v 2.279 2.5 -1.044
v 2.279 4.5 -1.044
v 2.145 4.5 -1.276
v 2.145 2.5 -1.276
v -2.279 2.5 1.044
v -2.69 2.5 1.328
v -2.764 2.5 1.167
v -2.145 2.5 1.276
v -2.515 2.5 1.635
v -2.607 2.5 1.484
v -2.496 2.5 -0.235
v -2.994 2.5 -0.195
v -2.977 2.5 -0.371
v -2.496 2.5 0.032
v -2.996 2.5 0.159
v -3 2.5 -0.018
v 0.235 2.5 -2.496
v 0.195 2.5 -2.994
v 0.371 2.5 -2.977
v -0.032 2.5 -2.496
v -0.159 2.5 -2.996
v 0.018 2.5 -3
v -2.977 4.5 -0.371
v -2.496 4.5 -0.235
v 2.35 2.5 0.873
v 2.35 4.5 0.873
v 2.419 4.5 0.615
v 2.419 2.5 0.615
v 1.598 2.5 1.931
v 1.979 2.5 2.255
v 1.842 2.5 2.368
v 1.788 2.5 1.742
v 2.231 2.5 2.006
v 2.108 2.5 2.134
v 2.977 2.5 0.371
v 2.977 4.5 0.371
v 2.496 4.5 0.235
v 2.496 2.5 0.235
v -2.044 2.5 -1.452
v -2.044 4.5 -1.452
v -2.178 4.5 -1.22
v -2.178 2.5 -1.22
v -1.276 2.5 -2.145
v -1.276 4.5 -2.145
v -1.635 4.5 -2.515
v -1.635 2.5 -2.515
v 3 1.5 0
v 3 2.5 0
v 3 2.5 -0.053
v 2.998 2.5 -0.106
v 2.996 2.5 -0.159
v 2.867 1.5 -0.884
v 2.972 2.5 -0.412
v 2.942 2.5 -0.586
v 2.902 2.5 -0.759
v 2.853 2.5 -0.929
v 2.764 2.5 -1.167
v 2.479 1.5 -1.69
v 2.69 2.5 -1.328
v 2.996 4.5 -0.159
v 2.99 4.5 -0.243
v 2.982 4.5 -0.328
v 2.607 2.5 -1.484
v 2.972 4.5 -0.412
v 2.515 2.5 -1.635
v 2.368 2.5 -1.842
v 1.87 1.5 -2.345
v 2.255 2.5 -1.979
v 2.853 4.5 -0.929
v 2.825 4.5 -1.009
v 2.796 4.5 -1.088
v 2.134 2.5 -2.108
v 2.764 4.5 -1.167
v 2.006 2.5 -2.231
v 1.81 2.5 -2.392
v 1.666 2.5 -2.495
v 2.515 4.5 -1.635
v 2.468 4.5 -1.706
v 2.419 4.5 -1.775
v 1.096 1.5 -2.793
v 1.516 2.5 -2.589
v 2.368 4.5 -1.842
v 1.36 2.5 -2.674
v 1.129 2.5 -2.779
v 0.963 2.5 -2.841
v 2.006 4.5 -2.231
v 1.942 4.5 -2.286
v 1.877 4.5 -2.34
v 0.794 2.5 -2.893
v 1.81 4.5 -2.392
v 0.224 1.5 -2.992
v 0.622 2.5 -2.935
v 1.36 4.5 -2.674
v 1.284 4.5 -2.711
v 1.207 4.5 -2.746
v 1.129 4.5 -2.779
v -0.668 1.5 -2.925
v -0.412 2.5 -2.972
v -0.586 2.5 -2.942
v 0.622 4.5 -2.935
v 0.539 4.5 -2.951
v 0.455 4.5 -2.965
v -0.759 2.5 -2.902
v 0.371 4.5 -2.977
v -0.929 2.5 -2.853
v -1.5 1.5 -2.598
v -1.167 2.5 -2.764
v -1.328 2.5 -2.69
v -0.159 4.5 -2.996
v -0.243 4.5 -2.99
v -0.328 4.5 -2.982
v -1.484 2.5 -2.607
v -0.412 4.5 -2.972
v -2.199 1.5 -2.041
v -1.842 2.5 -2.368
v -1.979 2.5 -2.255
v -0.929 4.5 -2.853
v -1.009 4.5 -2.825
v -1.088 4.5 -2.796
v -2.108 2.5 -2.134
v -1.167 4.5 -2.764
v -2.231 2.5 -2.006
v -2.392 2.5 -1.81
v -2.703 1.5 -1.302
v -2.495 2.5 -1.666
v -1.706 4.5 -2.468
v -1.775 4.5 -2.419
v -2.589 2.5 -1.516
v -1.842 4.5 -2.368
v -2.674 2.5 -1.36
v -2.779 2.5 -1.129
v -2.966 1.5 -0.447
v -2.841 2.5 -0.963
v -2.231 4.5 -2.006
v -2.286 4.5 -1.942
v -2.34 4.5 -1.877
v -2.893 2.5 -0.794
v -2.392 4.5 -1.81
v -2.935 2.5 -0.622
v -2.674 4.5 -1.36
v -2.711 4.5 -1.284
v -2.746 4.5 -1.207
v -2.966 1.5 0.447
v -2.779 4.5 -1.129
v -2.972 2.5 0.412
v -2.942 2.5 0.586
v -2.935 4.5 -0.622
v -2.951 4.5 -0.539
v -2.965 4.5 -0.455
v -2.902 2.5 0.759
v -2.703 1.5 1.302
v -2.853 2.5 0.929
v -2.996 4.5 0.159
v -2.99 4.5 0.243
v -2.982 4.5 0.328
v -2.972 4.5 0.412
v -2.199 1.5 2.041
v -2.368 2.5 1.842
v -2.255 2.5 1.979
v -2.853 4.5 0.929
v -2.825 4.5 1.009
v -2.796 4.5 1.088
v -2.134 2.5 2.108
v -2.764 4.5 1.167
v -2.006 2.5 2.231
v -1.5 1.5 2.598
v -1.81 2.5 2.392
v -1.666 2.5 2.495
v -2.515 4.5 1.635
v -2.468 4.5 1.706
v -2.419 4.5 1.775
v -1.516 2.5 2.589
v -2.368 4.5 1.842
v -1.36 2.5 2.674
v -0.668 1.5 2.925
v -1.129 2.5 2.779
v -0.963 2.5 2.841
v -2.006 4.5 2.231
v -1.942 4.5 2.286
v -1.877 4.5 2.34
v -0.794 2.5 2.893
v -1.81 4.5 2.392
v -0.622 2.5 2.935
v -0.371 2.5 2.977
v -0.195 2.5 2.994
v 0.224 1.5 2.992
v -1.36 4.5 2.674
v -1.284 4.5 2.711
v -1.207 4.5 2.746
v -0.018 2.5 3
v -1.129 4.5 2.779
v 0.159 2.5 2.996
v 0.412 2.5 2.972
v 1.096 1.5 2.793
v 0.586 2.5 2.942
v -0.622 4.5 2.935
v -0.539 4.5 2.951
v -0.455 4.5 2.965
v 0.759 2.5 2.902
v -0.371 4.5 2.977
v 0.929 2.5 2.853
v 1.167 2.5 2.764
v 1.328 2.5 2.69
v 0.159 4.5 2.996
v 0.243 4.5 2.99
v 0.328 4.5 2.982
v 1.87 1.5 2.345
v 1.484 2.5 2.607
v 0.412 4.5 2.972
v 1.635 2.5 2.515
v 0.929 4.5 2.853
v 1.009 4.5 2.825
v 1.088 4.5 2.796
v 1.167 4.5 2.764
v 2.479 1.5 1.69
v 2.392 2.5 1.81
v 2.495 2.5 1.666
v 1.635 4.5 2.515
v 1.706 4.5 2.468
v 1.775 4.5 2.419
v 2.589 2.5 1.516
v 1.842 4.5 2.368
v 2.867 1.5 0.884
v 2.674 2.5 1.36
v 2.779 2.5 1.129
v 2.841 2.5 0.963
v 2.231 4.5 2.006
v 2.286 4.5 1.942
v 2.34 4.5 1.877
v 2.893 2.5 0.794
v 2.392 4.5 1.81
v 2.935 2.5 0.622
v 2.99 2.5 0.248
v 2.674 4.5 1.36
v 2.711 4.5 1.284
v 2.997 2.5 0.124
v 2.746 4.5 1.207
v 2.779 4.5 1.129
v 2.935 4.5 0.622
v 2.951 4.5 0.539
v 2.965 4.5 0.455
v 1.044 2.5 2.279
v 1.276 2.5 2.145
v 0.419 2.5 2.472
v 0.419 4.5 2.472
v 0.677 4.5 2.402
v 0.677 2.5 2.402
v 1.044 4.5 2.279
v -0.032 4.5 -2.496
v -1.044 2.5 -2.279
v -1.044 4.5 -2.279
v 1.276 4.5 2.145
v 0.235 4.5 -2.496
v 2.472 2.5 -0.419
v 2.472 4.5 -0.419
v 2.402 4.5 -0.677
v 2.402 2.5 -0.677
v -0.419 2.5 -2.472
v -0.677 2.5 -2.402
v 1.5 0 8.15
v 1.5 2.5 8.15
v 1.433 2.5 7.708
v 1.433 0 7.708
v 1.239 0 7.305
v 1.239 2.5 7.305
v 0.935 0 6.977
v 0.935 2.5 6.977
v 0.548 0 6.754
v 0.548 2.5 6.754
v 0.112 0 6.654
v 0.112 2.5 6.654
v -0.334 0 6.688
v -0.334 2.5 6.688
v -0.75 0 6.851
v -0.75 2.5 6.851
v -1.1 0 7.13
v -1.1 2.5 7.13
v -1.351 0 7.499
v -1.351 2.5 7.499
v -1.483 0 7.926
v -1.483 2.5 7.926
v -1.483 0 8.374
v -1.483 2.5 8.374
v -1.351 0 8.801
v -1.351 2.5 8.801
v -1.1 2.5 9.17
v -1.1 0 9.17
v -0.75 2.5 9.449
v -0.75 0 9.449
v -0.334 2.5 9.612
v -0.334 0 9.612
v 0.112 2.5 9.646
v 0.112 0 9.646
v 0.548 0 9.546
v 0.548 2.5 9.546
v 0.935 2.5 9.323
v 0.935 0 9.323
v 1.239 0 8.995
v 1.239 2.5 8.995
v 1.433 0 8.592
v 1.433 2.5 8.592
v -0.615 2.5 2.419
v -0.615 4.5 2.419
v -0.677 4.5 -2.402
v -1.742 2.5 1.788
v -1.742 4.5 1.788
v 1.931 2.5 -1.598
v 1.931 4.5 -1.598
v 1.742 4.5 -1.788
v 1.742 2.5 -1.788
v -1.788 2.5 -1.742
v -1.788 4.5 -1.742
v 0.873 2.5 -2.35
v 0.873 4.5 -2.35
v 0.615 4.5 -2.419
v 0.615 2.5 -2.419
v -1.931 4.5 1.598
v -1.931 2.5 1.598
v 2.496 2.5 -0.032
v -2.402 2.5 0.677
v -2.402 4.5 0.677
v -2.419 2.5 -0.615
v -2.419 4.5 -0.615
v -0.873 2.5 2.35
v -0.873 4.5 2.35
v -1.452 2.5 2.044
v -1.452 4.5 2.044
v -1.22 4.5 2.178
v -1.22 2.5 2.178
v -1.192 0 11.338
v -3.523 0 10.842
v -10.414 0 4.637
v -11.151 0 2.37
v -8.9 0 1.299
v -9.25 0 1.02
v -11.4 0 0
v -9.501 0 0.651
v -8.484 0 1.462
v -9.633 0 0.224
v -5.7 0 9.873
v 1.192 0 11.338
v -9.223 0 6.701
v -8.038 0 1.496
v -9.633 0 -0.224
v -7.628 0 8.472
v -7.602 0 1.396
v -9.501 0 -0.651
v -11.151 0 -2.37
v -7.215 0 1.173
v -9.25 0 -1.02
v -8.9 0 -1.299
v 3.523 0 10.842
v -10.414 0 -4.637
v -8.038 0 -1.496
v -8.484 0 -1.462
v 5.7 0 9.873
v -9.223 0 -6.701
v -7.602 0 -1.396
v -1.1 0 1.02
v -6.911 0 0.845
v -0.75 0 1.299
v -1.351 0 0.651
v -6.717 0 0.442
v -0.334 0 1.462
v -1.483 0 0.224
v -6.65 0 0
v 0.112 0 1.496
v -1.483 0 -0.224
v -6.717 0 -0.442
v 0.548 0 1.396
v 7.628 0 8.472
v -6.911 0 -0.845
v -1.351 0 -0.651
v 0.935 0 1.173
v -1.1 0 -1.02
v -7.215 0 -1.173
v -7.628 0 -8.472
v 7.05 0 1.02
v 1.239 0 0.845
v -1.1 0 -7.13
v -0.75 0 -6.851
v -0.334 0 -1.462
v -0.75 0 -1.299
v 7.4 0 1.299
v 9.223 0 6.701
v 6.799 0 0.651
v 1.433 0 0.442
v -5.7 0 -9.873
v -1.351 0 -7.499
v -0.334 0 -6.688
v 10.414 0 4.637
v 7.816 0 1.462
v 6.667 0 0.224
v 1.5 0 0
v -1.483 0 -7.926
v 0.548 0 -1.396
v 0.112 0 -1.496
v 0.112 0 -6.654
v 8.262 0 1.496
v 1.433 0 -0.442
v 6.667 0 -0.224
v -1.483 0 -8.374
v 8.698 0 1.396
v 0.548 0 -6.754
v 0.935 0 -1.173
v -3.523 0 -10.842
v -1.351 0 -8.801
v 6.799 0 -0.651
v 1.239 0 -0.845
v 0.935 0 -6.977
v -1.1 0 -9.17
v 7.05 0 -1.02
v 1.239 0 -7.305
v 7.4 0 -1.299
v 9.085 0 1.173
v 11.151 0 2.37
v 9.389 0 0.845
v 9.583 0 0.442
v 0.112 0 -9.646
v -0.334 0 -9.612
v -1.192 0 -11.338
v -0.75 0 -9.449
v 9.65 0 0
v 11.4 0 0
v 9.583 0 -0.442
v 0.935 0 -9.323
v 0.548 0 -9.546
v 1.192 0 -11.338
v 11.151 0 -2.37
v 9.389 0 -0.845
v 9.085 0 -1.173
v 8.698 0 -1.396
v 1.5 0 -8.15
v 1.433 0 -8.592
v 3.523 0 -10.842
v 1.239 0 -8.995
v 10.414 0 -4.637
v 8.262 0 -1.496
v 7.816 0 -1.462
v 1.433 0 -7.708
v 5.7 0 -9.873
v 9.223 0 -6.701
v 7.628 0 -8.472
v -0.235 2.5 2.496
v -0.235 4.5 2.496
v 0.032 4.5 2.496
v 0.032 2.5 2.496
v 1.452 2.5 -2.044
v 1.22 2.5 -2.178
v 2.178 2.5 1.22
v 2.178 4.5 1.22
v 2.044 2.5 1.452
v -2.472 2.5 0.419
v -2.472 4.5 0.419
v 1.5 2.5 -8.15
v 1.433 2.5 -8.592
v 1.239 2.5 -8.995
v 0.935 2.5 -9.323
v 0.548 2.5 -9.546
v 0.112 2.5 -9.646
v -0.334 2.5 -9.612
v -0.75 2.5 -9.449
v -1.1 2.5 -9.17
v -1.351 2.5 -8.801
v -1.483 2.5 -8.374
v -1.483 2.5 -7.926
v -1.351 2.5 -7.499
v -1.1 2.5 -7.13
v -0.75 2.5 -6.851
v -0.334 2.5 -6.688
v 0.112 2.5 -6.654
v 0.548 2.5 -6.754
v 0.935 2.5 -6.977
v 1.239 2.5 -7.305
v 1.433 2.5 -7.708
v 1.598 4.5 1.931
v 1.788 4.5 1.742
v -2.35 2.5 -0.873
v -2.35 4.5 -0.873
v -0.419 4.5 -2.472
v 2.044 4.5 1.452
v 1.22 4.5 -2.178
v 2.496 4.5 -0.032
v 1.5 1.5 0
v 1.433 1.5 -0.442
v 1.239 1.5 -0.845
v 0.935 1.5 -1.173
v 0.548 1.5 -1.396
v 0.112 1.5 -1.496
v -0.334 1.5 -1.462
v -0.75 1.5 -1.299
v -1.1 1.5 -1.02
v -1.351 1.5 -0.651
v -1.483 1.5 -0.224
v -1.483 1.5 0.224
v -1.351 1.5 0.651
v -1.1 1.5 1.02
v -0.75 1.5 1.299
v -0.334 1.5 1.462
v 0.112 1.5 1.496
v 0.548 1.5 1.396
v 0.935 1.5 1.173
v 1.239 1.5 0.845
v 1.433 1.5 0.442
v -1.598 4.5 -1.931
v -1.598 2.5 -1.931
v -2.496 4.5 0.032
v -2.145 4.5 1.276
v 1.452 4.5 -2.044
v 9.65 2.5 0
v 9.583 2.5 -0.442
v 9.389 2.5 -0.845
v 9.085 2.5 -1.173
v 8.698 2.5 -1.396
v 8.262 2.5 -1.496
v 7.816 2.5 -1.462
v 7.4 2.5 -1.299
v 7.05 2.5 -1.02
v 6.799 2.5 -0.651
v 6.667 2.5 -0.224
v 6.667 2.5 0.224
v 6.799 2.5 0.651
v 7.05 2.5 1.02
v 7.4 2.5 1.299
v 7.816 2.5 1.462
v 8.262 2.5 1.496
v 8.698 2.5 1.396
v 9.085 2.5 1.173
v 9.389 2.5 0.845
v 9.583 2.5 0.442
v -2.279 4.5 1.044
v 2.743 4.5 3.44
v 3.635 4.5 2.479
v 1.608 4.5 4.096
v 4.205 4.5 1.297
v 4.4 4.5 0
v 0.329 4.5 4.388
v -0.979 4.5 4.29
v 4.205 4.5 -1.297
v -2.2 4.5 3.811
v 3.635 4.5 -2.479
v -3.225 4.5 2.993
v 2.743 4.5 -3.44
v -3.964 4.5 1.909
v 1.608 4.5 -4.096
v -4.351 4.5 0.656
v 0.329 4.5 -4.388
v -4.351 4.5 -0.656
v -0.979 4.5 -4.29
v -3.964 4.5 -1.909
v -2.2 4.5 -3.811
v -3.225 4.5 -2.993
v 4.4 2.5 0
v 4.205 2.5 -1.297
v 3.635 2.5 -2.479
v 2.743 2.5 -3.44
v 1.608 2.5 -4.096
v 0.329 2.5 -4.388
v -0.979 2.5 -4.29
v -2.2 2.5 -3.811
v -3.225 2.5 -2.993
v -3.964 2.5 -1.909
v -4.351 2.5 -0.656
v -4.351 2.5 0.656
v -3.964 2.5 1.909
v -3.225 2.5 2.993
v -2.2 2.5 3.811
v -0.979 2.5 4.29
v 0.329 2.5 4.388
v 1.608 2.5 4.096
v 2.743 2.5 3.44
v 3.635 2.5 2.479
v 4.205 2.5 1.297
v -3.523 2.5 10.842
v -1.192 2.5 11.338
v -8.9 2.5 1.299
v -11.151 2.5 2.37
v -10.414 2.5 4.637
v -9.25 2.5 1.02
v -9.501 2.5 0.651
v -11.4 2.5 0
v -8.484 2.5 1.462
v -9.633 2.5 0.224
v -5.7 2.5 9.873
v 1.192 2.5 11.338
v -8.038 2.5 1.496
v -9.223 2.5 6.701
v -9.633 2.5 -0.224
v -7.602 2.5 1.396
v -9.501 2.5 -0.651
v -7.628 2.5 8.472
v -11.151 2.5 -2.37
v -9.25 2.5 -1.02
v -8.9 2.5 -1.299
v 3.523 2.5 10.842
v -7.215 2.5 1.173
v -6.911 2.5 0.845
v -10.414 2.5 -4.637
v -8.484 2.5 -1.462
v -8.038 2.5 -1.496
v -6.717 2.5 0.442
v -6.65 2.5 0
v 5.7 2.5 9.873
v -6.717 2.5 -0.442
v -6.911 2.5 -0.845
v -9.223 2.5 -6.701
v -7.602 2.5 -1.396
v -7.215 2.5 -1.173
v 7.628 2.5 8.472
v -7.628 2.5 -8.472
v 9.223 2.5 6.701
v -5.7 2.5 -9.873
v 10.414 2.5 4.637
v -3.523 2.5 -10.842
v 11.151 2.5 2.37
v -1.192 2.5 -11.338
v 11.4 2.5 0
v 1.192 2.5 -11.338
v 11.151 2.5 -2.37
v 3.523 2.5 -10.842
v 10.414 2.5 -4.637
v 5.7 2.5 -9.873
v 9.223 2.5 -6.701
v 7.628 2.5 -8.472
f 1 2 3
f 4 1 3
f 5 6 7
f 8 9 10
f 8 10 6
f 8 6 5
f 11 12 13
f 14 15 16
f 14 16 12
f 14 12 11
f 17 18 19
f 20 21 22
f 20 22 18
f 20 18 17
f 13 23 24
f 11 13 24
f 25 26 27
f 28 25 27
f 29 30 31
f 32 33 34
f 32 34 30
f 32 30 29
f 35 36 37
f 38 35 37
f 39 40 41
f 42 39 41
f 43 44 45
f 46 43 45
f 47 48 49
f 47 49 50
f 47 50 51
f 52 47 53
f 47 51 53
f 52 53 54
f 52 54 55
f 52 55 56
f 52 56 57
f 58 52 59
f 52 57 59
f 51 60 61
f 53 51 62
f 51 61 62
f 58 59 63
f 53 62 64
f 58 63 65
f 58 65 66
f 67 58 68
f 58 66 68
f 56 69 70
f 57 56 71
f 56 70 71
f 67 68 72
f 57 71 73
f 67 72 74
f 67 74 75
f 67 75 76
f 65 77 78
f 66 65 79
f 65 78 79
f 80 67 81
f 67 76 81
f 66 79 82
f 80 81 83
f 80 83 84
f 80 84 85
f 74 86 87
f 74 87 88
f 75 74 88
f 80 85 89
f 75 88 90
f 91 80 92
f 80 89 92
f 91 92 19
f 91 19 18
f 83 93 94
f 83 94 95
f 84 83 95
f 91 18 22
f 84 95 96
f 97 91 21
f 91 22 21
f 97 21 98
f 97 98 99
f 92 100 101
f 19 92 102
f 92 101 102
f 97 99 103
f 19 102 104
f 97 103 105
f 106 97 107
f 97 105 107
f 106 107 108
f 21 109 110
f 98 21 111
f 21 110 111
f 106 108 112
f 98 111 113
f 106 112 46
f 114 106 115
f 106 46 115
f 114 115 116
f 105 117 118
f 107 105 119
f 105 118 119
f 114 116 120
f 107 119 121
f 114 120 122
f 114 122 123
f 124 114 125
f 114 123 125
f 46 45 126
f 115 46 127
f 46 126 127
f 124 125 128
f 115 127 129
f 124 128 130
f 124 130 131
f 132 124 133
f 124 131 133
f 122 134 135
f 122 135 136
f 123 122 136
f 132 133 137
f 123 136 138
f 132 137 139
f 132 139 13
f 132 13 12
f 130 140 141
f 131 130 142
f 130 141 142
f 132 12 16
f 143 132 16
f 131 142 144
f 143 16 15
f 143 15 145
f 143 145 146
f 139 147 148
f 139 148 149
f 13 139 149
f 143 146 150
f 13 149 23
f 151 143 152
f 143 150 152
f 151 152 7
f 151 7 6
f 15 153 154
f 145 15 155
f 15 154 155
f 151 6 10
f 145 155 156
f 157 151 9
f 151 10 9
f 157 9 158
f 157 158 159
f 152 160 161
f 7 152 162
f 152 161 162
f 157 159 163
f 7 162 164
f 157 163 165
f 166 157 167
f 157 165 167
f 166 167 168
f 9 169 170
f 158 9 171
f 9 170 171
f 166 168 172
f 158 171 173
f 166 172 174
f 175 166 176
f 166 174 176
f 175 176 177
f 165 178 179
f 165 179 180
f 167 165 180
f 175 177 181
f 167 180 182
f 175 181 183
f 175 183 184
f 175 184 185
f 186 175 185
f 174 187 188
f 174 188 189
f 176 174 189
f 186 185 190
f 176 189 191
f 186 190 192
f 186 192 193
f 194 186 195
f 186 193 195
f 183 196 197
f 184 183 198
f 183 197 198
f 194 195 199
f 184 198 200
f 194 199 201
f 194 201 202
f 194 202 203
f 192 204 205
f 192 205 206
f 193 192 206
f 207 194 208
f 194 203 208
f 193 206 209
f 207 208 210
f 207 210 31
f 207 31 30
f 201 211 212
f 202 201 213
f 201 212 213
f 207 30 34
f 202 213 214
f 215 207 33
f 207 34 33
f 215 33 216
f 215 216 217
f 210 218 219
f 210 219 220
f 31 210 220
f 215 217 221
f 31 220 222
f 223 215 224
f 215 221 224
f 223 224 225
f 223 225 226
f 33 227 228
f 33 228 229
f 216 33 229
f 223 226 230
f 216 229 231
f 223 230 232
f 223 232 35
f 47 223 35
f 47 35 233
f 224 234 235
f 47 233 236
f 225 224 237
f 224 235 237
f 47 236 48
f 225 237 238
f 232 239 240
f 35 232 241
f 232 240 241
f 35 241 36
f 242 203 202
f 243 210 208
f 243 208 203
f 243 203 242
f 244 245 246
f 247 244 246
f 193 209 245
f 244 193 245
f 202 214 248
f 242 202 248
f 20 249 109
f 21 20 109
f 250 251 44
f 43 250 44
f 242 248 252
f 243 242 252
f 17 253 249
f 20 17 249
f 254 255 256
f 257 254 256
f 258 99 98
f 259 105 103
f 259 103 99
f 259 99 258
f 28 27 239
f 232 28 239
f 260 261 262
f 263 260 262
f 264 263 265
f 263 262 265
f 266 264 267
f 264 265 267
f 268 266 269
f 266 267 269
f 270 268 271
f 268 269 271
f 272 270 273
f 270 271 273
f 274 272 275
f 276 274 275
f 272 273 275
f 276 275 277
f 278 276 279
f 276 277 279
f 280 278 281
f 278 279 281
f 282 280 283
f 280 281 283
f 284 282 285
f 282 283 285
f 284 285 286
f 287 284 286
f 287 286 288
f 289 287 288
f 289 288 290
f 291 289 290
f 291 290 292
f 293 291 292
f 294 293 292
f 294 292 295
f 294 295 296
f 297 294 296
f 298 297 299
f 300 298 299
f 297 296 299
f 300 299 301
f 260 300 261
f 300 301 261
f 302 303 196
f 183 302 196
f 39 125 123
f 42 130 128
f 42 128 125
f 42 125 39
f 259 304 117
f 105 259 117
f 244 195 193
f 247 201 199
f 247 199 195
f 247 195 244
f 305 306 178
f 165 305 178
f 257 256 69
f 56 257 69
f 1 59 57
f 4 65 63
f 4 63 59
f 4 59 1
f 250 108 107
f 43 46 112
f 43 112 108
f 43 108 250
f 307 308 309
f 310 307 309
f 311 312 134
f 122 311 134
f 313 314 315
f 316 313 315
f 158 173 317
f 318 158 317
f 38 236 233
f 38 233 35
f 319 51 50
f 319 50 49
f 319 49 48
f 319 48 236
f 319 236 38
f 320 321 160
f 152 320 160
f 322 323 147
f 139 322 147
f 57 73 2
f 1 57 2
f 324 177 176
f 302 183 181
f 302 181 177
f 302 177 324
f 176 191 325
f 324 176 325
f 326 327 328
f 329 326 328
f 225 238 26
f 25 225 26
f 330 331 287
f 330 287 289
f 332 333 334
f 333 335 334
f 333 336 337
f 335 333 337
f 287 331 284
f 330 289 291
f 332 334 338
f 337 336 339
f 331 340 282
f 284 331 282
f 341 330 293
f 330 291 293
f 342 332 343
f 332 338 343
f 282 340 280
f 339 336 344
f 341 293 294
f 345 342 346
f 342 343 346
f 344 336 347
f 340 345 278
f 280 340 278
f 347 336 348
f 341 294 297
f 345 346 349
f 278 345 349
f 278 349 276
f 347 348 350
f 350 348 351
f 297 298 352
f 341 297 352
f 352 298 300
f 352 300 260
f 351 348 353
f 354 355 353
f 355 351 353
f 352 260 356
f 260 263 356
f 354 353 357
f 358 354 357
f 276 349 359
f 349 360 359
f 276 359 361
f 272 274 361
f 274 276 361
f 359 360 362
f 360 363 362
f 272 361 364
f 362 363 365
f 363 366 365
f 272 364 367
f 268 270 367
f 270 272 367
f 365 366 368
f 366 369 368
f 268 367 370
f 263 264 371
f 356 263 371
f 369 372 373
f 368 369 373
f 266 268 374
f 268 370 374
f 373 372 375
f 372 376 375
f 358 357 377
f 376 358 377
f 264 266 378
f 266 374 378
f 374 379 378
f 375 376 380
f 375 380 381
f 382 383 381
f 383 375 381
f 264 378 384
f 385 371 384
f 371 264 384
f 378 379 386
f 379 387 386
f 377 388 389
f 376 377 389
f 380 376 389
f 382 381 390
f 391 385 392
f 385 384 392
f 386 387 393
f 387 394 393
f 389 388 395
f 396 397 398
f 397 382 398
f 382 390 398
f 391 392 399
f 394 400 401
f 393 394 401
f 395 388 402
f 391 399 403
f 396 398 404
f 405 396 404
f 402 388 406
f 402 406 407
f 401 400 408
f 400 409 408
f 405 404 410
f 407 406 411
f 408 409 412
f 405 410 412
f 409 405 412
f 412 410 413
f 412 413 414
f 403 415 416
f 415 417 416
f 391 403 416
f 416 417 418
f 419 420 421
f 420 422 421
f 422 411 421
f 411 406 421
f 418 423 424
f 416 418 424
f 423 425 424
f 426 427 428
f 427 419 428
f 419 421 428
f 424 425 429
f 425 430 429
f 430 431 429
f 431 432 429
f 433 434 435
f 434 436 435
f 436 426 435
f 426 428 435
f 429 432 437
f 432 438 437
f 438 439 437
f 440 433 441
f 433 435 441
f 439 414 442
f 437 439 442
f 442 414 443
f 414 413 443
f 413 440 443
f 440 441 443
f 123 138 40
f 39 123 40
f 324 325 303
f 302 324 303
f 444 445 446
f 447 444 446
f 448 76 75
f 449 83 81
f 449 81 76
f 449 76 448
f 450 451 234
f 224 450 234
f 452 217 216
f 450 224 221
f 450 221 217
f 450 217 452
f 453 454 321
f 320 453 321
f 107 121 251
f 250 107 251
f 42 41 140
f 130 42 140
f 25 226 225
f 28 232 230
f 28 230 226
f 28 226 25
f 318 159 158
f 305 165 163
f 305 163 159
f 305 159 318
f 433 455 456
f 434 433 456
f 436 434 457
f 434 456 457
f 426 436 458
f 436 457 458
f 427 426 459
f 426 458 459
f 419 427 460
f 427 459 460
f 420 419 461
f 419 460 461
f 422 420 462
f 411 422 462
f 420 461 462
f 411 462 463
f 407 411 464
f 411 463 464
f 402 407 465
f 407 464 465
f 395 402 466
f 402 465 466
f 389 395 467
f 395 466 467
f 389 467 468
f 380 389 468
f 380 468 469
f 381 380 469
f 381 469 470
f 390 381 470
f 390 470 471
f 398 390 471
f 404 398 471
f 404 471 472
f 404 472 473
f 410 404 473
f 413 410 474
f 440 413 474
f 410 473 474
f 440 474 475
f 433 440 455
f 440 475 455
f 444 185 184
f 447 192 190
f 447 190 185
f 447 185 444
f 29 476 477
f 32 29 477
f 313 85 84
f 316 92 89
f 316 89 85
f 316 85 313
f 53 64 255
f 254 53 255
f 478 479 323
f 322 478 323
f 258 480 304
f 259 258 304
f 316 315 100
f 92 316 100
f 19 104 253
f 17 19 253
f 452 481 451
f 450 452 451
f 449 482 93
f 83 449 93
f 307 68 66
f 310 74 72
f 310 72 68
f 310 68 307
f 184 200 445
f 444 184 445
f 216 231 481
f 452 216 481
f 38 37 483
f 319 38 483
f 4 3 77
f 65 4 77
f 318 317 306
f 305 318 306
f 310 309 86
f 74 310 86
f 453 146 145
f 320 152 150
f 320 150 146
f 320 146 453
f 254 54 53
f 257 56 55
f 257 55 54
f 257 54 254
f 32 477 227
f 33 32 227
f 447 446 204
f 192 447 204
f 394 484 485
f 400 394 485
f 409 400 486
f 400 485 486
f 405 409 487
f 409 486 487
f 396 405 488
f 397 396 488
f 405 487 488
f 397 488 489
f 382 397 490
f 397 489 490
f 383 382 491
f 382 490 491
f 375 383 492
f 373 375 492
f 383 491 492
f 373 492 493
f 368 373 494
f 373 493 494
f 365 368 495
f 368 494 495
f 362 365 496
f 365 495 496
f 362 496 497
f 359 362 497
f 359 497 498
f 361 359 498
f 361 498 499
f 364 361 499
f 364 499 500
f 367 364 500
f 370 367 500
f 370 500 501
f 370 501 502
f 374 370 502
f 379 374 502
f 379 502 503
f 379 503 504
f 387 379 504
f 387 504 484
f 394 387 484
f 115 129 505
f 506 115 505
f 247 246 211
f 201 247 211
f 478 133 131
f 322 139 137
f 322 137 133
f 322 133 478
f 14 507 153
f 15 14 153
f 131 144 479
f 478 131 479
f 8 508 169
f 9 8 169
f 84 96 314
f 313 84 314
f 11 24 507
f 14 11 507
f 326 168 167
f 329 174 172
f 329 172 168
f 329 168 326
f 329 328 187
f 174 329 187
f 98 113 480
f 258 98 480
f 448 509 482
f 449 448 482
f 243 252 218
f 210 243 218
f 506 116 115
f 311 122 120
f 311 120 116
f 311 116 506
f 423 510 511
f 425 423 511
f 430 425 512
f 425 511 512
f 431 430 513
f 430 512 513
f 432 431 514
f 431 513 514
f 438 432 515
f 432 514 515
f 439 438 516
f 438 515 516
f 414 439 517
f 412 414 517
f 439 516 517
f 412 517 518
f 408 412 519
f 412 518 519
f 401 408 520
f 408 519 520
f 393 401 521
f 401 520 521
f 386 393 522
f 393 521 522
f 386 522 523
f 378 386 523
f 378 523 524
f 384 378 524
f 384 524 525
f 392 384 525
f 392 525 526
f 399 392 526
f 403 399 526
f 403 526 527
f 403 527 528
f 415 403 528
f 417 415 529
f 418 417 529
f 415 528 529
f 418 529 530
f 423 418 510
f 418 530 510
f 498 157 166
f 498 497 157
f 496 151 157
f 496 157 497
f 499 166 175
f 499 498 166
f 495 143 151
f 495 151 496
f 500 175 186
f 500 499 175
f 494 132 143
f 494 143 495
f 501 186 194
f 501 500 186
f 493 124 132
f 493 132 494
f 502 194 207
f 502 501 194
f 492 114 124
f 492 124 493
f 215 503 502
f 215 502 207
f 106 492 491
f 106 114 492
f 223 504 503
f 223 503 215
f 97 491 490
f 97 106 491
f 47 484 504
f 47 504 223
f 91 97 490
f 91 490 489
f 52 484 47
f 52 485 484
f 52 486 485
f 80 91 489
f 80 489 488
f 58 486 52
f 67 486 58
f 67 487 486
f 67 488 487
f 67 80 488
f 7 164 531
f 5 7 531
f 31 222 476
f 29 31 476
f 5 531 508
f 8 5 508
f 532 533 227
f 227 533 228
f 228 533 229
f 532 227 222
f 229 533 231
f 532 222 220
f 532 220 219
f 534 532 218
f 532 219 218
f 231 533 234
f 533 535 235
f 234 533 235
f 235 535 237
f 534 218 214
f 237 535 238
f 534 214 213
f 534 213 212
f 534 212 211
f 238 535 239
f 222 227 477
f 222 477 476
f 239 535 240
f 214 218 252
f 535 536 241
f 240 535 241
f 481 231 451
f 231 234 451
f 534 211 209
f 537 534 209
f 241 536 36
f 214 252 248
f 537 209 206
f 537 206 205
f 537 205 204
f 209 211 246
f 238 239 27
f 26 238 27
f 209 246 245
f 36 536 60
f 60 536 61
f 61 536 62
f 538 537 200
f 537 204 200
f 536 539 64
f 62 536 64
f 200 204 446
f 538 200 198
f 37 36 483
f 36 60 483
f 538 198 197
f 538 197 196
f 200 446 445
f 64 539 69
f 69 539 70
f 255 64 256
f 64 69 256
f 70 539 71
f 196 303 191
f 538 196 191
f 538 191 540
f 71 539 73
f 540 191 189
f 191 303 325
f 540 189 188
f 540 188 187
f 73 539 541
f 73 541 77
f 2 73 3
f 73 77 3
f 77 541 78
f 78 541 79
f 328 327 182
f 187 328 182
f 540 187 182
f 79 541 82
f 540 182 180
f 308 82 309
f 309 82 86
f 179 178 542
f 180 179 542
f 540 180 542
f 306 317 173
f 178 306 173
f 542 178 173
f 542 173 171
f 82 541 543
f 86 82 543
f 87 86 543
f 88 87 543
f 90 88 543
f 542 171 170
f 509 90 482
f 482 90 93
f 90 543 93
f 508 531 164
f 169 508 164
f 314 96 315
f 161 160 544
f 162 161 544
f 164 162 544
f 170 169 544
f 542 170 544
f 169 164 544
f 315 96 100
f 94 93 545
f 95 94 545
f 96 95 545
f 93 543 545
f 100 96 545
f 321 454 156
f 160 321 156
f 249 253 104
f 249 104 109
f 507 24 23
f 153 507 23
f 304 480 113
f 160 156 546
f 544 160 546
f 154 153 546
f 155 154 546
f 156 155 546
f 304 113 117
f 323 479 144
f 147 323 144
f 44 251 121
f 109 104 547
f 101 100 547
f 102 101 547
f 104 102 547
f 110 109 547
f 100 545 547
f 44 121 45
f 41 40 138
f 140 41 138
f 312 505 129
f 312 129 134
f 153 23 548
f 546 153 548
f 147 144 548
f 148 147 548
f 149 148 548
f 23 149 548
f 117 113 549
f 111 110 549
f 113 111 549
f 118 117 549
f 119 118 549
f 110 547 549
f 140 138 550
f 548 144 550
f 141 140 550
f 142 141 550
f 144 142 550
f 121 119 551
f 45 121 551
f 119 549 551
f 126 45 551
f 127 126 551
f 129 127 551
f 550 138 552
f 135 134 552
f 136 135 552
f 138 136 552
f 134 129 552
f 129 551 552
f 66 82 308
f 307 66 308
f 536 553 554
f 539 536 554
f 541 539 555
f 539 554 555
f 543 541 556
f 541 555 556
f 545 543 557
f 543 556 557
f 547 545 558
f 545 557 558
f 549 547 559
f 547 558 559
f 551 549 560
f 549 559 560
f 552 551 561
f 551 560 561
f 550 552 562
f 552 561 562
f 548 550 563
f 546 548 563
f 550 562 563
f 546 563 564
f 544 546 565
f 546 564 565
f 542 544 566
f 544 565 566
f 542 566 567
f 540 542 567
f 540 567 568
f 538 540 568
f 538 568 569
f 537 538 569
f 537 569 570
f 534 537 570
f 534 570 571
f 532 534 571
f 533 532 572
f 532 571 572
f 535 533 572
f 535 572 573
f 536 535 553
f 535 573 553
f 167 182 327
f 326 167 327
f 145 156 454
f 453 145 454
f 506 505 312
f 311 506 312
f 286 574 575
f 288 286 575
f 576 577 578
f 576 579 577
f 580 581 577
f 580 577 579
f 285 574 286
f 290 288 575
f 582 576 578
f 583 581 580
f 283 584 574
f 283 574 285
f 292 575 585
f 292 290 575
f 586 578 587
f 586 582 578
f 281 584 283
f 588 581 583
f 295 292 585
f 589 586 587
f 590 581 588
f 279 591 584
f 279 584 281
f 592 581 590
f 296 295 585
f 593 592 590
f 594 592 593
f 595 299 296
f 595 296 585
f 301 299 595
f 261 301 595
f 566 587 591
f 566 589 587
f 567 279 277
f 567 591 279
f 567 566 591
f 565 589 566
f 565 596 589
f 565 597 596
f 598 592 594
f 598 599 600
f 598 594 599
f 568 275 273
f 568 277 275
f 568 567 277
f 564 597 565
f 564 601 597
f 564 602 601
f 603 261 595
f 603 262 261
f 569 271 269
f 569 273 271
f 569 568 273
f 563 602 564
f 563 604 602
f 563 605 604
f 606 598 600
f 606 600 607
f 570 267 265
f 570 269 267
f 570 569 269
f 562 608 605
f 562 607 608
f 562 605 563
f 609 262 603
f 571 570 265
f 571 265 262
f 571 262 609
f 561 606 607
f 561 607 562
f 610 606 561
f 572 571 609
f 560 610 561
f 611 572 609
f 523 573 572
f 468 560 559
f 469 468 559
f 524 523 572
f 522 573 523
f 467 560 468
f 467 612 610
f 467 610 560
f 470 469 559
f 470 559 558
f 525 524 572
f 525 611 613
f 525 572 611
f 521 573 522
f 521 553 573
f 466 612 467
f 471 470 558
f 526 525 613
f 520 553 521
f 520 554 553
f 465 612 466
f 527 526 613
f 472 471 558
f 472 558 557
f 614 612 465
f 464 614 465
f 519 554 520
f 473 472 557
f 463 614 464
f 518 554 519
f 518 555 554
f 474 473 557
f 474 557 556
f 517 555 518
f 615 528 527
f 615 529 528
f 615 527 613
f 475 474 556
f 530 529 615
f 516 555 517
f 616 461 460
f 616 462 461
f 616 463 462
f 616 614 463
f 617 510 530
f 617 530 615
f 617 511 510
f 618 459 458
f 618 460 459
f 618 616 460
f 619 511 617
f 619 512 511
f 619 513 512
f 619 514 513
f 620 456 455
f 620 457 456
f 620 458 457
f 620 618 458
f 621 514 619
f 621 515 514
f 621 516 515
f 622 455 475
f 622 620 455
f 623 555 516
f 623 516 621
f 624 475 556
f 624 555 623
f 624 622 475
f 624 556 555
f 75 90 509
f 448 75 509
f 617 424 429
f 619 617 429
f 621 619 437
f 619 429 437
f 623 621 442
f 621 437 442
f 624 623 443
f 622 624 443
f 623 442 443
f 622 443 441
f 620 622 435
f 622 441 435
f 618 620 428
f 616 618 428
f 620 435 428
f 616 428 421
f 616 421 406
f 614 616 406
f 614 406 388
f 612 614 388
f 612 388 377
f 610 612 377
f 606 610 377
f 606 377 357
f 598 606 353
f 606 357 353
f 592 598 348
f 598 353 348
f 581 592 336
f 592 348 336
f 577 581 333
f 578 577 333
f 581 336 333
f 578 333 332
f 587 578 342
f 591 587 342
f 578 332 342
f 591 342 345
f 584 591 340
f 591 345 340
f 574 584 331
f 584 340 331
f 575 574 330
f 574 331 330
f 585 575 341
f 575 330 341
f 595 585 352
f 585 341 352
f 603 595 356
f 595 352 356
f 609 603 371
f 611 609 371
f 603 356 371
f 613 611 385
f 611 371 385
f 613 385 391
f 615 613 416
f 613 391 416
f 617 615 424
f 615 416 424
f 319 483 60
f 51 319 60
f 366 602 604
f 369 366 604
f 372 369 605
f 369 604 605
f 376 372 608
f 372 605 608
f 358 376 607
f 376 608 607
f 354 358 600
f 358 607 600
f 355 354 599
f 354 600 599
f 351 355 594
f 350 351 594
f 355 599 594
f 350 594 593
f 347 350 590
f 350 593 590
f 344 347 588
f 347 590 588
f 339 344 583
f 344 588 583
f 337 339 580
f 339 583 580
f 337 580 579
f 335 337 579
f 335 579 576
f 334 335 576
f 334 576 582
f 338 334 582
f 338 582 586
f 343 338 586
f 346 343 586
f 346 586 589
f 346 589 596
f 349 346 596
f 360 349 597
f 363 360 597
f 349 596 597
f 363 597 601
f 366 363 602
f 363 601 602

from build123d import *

# Parameters (mm, degrees)
SKETCH_4_R               = 11.4
EXTRUDE_2_DEPTH          = 2.5
SKETCH_6_R               = 1.5
CUT_EXTRUDE_9_DEPTH      = 2.5
SKETCH_7_R               = 4.4
EXTRUDE_3_DEPTH          = 2
SKETCH_8_R               = 3
CUT_EXTRUDE_10_DEPTH     = 3
EXTRUDE_5_DEPTH          = 2
PATTERN_CIRCULAR_1_COUNT = 24


with BuildPart() as part:
    # 草图4 → 凸台-拉伸2 (new body)
    with BuildSketch(Plane(origin=(0, 0, 0), x_dir=(1, 0, 0), z_dir=(0, 1, 0))):
        Circle(SKETCH_4_R)
    extrude(amount=EXTRUDE_2_DEPTH)

    # 草图6 → 切除-拉伸9 (cut)
    with BuildSketch(Plane(origin=(0, 2.5, 0), x_dir=(1, 0, 0), z_dir=(0, 1, 0))):
        with Locations((0, 8.15)):
            Circle(SKETCH_6_R)
        Circle(SKETCH_6_R)
        with Locations((8.15, 0)):
            Circle(SKETCH_6_R)
        with Locations((-8.15, 0)):
            Circle(SKETCH_6_R)
        with Locations((0, -8.15)):
            Circle(SKETCH_6_R)
    extrude(amount=-CUT_EXTRUDE_9_DEPTH, mode=Mode.SUBTRACT)

    # 草图7 → 凸台-拉伸3 (add)
    with BuildSketch(Plane(origin=(0, 2.5, 0), x_dir=(1, 0, 0), z_dir=(0, 1, 0))):
        Circle(SKETCH_7_R)
    extrude(amount=EXTRUDE_3_DEPTH)

    # 草图8 → 切除-拉伸10 (cut)
    with BuildSketch(Plane(origin=(0, 4.5, 0), x_dir=(1, 0, 0), z_dir=(0, 1, 0))):
        Circle(SKETCH_8_R)
    extrude(amount=-CUT_EXTRUDE_10_DEPTH, mode=Mode.SUBTRACT)

    # 草图14 → 凸台-拉伸5 (add)
    with BuildSketch(Plane(origin=(0, 4.5, 0), x_dir=(1, 0, 0), z_dir=(0, 1, 0))):
        with BuildLine():
            Line((2.976910005, -0.371492698), (2.495792863, -0.23538136))
            Line((2.495792863, -0.23538136), (2.495792863, 0.032272898))
            Line((2.495792863, 0.032272898), (2.995792863, 0.158824181))
            ThreePointArc((2.995792863, 0.158824181), (2.998100046, -0.106752588), (2.976910005, -0.371492698))
        make_face()
    extrude_5 = extrude(amount=-EXTRUDE_5_DEPTH)

    # 阵列(圆周)1: 凸台-拉伸5 ×24 about axis
    pattern_circular_1_axis = Axis((0, 4.5, 0), (0, 1, 0))
    for i in range(1, PATTERN_CIRCULAR_1_COUNT):
        add(extrude_5.rotate(pattern_circular_1_axis, i * 360 / PATTERN_CIRCULAR_1_COUNT))


solid = part.part
